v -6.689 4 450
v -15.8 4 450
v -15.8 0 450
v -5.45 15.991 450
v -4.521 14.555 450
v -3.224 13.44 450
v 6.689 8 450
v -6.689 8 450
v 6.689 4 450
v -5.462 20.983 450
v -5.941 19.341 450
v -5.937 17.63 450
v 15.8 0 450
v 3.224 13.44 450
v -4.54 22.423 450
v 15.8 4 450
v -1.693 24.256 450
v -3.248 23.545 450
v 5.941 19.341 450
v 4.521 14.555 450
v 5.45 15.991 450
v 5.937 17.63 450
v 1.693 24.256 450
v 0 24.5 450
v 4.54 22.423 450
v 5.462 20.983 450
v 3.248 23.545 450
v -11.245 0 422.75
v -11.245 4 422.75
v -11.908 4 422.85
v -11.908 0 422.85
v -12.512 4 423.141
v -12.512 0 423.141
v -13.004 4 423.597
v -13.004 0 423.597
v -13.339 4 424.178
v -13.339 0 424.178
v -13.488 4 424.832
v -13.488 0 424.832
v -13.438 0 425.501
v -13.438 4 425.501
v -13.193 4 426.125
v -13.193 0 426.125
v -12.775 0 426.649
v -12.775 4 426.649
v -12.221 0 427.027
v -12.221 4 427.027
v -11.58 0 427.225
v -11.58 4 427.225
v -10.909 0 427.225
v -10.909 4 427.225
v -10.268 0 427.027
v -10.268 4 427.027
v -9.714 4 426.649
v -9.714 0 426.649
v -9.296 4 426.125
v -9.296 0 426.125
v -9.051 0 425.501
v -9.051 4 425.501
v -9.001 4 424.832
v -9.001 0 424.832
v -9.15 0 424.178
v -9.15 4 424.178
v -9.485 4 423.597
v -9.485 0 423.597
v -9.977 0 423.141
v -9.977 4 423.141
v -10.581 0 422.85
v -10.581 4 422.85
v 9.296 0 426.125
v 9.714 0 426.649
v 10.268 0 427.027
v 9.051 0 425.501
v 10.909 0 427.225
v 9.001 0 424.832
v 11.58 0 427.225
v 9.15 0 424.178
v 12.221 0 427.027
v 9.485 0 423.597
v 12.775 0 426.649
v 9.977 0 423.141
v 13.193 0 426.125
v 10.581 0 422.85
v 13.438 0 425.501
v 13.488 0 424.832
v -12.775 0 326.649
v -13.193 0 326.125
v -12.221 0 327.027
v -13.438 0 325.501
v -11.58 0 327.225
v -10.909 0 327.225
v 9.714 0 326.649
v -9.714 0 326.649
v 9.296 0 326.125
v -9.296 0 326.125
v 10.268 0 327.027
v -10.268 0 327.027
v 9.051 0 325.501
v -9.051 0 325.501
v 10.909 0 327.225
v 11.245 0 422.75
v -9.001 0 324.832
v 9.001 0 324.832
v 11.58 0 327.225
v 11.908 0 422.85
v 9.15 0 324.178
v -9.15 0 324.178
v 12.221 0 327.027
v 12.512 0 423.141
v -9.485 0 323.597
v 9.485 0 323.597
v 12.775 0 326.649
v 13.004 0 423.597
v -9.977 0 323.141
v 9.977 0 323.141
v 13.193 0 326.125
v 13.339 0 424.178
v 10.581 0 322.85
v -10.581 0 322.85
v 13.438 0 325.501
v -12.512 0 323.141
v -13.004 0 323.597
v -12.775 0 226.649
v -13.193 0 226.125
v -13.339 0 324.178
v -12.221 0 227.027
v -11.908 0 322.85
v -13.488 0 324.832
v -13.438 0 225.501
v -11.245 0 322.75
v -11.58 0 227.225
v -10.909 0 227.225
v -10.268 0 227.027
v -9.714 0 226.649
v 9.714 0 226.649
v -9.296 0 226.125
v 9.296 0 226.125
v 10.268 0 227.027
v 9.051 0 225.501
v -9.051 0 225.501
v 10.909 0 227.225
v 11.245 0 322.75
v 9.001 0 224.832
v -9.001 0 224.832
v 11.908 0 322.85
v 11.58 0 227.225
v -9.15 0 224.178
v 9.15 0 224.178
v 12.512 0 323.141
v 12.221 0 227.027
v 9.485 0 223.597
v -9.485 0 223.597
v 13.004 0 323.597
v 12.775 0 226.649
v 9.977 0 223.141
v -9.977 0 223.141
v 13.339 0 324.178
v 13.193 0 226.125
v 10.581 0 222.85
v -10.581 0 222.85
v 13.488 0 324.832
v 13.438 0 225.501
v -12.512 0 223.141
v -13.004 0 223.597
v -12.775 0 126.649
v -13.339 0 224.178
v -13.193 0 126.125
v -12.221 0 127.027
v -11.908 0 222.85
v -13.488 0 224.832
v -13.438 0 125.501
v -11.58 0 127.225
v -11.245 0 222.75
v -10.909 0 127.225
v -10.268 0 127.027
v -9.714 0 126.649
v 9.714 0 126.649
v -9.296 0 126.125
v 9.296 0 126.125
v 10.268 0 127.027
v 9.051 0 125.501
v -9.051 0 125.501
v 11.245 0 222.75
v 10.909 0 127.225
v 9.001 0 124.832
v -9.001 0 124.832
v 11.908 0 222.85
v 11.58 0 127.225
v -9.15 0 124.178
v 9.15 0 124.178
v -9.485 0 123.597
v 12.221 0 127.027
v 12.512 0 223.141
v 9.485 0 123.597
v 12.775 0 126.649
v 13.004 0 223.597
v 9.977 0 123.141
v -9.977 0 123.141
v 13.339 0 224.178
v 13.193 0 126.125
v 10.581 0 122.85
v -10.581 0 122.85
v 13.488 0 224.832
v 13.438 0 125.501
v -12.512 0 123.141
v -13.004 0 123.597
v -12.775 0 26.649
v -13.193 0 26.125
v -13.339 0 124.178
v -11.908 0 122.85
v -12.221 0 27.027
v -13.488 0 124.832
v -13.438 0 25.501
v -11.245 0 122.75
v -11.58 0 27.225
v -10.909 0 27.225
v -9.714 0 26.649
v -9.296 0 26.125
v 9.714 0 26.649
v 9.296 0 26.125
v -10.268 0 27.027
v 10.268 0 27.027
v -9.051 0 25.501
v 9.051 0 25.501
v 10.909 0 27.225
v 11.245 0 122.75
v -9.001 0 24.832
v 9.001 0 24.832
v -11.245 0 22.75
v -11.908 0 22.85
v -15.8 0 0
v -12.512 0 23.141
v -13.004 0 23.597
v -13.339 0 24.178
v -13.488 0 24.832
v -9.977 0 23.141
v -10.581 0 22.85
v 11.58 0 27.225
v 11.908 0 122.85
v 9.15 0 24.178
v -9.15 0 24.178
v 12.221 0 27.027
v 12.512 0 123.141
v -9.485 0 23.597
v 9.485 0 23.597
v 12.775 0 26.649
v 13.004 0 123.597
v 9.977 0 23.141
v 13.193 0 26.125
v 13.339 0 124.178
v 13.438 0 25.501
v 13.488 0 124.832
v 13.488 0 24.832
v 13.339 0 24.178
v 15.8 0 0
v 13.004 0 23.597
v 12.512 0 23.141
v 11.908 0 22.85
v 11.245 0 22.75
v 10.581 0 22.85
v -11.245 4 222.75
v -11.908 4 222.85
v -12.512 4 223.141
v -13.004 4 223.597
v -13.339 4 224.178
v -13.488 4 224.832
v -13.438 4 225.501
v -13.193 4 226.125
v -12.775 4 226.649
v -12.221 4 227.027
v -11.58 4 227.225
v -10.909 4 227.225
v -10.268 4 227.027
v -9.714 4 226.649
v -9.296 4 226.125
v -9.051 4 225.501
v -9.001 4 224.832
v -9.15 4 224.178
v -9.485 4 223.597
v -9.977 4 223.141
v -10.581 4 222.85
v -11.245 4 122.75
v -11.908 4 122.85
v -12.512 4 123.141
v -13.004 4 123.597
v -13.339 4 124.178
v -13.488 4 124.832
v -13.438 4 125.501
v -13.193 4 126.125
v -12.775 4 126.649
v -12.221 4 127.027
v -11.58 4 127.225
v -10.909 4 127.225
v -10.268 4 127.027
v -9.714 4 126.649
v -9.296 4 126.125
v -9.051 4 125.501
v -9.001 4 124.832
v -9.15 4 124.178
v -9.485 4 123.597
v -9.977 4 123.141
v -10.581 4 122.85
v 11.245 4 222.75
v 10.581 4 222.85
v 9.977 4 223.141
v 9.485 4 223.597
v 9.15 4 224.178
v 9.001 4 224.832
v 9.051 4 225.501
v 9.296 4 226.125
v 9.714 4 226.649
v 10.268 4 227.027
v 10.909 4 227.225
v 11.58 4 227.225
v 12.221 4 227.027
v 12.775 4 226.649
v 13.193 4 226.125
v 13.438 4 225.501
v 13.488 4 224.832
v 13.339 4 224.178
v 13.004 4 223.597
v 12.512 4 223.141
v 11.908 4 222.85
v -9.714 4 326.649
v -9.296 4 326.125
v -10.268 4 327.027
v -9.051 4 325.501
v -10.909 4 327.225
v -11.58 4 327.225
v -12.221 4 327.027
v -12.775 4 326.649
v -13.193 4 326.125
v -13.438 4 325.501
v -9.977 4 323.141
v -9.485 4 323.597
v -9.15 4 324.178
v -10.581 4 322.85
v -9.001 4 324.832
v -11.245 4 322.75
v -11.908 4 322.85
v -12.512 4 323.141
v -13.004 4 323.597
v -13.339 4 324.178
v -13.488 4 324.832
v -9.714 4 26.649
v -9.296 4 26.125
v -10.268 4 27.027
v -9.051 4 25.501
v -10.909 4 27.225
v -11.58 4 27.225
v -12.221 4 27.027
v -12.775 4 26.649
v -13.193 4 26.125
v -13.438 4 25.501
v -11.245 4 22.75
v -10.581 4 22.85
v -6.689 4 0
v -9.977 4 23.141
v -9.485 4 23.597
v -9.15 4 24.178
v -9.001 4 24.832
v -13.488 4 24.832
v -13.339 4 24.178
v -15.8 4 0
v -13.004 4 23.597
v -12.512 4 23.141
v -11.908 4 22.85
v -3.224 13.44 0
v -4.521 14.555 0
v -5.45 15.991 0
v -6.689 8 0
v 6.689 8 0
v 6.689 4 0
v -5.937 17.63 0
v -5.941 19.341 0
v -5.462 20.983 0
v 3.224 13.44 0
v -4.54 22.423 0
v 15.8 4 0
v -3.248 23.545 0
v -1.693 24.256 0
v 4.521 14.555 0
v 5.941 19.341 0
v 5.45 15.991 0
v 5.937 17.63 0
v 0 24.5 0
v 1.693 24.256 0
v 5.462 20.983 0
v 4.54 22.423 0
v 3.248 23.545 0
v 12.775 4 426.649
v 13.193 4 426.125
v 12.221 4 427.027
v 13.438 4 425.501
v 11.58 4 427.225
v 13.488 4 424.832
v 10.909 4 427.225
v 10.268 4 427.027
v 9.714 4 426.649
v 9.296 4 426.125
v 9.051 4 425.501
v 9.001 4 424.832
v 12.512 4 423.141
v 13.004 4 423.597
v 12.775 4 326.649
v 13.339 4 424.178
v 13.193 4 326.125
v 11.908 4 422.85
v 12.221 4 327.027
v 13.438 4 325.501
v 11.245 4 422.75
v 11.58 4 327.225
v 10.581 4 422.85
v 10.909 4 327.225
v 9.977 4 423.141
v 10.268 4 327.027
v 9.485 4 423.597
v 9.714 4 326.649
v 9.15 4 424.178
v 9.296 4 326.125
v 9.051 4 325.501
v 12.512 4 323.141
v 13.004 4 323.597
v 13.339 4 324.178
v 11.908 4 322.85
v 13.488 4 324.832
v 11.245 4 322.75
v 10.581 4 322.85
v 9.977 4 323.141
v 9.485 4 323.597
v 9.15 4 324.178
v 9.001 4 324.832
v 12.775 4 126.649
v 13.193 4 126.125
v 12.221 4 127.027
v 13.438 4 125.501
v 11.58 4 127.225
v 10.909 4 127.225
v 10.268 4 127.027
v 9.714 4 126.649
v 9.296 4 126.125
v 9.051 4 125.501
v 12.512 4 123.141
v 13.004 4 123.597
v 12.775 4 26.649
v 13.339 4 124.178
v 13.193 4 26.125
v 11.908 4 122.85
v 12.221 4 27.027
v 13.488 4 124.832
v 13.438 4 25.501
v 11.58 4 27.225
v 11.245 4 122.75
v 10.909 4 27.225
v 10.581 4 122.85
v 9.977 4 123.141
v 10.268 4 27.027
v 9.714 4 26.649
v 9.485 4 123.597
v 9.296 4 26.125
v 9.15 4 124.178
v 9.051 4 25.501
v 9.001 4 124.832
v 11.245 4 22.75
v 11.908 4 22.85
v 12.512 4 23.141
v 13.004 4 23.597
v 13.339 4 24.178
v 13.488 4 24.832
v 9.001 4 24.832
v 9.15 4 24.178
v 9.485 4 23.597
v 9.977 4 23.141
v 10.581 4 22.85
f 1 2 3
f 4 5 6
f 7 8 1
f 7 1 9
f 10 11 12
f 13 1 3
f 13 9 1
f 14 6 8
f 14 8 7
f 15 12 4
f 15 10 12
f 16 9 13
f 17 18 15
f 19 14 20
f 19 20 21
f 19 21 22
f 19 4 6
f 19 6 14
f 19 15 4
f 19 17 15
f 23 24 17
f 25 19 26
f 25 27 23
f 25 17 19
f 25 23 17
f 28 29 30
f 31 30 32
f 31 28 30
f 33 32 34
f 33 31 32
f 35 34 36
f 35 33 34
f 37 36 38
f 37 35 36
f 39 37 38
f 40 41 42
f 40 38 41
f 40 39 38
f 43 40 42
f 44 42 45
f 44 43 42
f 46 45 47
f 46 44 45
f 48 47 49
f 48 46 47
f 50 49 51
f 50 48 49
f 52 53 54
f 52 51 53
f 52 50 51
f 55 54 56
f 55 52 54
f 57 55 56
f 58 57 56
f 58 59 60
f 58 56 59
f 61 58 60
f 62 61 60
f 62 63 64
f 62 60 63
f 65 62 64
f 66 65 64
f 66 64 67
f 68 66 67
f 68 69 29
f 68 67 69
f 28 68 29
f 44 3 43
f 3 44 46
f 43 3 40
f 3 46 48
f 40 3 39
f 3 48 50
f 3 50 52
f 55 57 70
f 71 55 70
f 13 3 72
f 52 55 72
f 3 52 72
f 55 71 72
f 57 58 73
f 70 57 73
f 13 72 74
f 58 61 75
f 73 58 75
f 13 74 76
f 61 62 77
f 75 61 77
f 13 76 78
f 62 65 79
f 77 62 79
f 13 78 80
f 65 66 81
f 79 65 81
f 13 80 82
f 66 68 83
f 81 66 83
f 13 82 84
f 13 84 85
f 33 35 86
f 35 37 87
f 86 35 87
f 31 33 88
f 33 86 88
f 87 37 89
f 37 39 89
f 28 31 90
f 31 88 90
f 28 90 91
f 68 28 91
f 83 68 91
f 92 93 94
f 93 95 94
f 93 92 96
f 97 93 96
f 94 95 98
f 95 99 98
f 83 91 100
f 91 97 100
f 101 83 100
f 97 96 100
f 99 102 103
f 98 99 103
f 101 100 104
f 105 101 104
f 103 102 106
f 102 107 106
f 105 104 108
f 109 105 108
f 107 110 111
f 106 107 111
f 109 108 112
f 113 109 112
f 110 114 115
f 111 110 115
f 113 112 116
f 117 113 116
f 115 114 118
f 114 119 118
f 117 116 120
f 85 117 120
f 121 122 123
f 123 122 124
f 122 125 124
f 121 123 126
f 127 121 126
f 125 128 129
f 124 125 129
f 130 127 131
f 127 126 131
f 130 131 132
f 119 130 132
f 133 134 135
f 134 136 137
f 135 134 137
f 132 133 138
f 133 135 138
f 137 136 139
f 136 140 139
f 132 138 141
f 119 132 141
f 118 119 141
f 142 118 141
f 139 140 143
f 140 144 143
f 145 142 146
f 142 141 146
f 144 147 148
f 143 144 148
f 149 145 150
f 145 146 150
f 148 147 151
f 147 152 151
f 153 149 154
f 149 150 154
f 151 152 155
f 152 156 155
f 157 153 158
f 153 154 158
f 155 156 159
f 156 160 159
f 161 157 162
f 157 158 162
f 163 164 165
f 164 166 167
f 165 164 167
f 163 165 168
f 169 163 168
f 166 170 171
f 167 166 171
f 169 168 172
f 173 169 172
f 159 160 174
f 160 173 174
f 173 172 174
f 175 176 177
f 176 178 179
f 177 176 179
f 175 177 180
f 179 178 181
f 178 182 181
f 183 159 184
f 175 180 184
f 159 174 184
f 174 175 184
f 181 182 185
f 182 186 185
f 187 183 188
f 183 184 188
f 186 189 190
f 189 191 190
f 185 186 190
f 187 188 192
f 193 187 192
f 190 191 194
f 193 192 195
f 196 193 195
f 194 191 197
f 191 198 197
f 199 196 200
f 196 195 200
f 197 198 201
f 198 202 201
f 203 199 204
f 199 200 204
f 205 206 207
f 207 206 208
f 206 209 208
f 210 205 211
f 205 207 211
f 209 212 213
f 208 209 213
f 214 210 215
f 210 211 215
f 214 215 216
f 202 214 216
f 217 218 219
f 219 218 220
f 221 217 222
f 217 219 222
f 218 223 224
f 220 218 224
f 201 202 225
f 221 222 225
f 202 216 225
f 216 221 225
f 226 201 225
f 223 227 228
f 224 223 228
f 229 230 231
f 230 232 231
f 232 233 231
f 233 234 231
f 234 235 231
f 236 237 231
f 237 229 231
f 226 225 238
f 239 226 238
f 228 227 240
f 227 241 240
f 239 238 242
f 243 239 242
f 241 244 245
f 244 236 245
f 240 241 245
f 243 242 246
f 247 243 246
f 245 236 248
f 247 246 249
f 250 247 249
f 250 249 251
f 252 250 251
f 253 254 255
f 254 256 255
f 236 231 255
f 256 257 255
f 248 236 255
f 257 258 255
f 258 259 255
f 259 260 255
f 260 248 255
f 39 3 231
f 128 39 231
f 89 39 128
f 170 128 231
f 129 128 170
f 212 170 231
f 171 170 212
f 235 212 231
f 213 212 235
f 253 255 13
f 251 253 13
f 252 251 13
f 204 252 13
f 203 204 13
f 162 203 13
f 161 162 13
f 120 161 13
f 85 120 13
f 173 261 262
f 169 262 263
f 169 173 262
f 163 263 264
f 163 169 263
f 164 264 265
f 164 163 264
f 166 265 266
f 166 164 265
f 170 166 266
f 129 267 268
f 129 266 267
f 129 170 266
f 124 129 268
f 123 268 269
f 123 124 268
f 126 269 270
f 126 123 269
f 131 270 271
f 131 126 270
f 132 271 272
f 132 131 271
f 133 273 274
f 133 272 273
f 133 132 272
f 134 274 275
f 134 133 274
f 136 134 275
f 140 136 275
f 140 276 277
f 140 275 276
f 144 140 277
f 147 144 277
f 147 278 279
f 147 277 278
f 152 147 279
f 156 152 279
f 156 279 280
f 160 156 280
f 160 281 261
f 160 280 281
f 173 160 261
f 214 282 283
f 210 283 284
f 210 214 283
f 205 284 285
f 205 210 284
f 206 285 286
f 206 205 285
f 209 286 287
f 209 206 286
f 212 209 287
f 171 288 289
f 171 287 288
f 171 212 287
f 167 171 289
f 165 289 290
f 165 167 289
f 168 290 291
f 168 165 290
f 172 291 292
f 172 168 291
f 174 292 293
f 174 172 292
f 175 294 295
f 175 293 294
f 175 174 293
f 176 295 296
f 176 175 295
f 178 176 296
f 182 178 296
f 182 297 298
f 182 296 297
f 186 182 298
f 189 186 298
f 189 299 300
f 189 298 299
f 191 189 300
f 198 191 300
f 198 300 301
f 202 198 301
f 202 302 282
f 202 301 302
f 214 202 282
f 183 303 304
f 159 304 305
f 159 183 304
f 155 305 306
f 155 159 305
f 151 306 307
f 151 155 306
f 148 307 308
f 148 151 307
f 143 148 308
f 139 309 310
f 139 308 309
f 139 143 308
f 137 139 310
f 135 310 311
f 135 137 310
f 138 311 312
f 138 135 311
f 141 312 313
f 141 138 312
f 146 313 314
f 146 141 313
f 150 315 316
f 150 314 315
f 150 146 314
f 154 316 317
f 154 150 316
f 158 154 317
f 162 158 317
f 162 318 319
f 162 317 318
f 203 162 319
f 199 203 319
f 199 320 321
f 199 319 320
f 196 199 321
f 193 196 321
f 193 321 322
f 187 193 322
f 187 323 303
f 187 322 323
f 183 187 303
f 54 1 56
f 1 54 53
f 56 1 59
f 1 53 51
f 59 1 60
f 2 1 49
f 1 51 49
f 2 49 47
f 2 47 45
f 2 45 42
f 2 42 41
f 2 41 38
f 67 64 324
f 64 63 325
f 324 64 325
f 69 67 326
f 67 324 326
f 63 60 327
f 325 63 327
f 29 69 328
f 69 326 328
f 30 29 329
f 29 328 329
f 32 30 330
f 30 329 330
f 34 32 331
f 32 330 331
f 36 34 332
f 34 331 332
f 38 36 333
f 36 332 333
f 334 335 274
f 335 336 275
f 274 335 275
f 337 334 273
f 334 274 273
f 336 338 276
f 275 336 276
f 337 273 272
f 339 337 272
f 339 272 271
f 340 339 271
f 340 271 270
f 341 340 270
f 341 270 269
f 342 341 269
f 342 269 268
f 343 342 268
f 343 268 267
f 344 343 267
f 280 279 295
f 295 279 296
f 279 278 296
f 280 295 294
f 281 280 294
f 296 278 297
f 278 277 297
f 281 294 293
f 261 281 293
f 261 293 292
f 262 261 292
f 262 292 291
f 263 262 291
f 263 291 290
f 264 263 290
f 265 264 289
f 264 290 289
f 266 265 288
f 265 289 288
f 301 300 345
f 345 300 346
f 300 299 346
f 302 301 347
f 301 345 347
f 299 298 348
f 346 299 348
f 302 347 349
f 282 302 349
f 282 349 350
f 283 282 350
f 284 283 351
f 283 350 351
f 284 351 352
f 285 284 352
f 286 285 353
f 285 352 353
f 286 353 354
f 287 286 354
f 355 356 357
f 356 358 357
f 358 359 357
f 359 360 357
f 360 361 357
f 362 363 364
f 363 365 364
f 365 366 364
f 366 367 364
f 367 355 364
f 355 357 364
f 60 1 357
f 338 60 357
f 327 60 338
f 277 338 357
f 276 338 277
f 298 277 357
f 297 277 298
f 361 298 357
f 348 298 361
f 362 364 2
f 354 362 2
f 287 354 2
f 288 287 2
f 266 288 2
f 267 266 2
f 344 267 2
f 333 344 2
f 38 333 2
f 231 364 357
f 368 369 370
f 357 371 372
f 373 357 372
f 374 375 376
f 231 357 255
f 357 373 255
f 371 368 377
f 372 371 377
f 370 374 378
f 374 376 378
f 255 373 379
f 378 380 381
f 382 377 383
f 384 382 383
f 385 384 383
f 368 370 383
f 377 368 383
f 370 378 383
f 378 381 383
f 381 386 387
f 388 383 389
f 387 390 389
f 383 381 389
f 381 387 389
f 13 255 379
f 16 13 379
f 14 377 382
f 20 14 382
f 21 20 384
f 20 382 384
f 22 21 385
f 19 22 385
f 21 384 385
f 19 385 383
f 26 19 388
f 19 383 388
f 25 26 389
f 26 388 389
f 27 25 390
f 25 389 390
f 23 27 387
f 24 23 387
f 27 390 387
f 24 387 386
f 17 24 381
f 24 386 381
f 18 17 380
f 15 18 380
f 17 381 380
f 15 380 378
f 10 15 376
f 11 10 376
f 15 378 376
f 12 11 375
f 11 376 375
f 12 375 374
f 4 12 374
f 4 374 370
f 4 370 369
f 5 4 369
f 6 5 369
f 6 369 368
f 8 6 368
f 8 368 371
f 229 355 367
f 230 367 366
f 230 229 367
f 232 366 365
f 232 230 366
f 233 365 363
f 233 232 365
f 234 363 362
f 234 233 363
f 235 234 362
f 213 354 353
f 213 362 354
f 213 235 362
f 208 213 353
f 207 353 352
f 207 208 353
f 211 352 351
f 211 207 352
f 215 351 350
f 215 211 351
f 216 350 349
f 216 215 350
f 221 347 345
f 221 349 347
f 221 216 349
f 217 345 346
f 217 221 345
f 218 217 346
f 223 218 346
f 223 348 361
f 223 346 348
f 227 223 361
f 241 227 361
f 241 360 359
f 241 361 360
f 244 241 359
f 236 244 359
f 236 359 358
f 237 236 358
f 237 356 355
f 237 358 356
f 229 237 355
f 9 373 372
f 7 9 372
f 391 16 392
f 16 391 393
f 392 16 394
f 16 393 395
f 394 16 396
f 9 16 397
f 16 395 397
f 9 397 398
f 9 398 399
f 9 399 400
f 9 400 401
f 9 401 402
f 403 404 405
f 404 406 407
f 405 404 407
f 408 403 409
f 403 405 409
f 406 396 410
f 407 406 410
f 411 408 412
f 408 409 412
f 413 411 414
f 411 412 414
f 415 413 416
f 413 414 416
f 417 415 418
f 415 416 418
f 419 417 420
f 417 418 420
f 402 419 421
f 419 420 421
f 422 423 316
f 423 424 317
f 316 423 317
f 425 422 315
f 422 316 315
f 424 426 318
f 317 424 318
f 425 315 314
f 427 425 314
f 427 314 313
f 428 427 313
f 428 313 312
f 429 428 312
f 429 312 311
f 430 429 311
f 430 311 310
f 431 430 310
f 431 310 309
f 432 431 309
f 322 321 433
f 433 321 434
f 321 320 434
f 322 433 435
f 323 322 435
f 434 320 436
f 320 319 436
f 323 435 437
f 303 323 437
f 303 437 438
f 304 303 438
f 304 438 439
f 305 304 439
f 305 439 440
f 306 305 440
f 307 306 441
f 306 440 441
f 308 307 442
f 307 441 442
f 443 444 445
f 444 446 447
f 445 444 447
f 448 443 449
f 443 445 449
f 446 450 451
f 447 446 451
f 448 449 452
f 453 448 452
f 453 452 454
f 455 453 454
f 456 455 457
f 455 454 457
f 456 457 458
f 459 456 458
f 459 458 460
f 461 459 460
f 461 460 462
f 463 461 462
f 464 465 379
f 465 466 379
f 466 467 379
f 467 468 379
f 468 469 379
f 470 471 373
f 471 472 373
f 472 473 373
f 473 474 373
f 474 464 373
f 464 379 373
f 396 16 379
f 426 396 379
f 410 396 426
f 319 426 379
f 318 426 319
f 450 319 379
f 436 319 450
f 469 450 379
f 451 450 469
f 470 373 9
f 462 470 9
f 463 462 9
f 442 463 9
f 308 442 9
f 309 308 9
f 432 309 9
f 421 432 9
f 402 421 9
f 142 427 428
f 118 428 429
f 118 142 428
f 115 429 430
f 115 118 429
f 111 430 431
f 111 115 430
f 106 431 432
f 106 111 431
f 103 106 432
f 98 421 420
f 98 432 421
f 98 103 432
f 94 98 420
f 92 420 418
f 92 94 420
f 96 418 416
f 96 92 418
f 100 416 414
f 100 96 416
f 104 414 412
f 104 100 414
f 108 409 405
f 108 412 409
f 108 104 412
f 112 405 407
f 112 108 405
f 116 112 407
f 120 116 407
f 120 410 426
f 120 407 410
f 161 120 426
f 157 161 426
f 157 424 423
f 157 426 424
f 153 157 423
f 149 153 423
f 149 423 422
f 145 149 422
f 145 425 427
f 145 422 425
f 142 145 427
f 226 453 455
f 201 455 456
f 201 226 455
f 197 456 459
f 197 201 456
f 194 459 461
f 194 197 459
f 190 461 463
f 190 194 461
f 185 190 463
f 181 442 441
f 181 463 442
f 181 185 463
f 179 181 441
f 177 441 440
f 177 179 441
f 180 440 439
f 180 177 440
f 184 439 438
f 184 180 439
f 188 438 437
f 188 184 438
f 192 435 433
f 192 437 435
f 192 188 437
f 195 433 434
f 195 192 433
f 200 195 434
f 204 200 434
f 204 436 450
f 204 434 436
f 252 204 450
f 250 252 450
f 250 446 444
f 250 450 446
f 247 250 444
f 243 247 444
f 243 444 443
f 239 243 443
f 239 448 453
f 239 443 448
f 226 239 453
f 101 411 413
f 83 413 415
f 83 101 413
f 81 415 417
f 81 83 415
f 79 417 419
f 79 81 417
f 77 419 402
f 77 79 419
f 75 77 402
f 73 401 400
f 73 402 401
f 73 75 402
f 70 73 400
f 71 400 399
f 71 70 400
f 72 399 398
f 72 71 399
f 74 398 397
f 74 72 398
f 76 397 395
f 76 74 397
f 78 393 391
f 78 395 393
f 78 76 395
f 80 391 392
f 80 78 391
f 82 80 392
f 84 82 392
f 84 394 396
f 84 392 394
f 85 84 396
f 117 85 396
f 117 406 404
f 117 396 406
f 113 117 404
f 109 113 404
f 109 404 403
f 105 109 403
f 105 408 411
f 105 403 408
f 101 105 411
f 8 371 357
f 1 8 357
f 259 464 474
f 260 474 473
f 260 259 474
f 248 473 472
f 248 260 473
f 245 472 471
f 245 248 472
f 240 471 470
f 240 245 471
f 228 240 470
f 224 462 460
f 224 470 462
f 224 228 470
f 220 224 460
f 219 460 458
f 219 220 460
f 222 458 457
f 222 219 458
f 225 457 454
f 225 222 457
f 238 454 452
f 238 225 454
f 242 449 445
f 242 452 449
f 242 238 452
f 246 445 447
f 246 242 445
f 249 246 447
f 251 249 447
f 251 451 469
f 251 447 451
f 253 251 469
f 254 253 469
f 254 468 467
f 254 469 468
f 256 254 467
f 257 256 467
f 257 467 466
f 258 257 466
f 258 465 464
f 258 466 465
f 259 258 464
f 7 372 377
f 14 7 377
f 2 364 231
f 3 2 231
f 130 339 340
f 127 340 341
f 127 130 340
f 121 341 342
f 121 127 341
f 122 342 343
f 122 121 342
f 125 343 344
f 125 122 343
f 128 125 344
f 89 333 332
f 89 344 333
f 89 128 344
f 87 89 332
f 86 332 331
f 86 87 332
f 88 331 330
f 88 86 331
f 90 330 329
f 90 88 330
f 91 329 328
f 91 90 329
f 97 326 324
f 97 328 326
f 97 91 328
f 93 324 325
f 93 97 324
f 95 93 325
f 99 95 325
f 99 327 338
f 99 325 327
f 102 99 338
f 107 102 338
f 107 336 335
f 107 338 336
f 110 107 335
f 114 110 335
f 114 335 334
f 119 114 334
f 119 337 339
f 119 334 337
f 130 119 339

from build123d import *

# Parameters (mm, degrees)
BOSS_EXTRUDE1_DEPTH = 450
SKETCH3_R           = 2.25
CUT_EXTRUDE2_DEPTH  = 451.943333469


with BuildPart() as part:
    # Sketch1 → Boss-Extrude1 (new body)
    with BuildSketch(Plane.XY):
        with BuildLine():
            Line((-15.8, 0), (15.8, 0))
            Line((15.8, 0), (15.8, 4))
            Line((15.8, 4), (6.689237738, 4))
            Line((6.689237738, 4), (6.689237738, 8))
            Line((6.689237738, 8), (3.22379765, 13.439651325))
            ThreePointArc((3.22379765, 13.439651325), (0, 24.5), (-3.22379765, 13.439651325))
            Line((-3.22379765, 13.439651325), (-6.689237738, 8))
            Line((-6.689237738, 8), (-6.689237738, 4))
            Line((-6.689237738, 4), (-15.8, 4))
            Line((-15.8, 4), (-15.8, 0))
        make_face()
    extrude(amount=BOSS_EXTRUDE1_DEPTH)

    # Sketch3 → Cut-Extrude2 (cut, through all)
    with BuildSketch(Plane(origin=(0, 0, 0), x_dir=(1, 0, 0), z_dir=(0, 1, 0))):
        with Locations(Location((-11.244618869, -25, 0), (0, 0, 90))):
            Circle(SKETCH3_R)
        with Locations(Location((11.244618869, -25, 0), (0, 0, 90))):
            Circle(SKETCH3_R)
        with Locations(Location((-11.244618869, -125, 0), (0, 0, 90))):
            Circle(SKETCH3_R)
        with Locations(Location((11.244618869, -125, 0), (0, 0, 90))):
            Circle(SKETCH3_R)
        with Locations(Location((-11.244618869, -225, 0), (0, 0, 90))):
            Circle(SKETCH3_R)
        with Locations(Location((11.244618869, -225, 0), (0, 0, 90))):
            Circle(SKETCH3_R)
        with Locations(Location((-11.244618869, -325, 0), (0, 0, 90))):
            Circle(SKETCH3_R)
        with Locations(Location((11.244618869, -325, 0), (0, 0, 90))):
            Circle(SKETCH3_R)
        with Locations(Location((-11.244618869, -425, 0), (0, 0, 90))):
            Circle(SKETCH3_R)
        with Locations(Location((11.244618869, -425, 0), (0, 0, 90))):
            Circle(SKETCH3_R)
    extrude(amount=CUT_EXTRUDE2_DEPTH, mode=Mode.SUBTRACT)


solid = part.part
